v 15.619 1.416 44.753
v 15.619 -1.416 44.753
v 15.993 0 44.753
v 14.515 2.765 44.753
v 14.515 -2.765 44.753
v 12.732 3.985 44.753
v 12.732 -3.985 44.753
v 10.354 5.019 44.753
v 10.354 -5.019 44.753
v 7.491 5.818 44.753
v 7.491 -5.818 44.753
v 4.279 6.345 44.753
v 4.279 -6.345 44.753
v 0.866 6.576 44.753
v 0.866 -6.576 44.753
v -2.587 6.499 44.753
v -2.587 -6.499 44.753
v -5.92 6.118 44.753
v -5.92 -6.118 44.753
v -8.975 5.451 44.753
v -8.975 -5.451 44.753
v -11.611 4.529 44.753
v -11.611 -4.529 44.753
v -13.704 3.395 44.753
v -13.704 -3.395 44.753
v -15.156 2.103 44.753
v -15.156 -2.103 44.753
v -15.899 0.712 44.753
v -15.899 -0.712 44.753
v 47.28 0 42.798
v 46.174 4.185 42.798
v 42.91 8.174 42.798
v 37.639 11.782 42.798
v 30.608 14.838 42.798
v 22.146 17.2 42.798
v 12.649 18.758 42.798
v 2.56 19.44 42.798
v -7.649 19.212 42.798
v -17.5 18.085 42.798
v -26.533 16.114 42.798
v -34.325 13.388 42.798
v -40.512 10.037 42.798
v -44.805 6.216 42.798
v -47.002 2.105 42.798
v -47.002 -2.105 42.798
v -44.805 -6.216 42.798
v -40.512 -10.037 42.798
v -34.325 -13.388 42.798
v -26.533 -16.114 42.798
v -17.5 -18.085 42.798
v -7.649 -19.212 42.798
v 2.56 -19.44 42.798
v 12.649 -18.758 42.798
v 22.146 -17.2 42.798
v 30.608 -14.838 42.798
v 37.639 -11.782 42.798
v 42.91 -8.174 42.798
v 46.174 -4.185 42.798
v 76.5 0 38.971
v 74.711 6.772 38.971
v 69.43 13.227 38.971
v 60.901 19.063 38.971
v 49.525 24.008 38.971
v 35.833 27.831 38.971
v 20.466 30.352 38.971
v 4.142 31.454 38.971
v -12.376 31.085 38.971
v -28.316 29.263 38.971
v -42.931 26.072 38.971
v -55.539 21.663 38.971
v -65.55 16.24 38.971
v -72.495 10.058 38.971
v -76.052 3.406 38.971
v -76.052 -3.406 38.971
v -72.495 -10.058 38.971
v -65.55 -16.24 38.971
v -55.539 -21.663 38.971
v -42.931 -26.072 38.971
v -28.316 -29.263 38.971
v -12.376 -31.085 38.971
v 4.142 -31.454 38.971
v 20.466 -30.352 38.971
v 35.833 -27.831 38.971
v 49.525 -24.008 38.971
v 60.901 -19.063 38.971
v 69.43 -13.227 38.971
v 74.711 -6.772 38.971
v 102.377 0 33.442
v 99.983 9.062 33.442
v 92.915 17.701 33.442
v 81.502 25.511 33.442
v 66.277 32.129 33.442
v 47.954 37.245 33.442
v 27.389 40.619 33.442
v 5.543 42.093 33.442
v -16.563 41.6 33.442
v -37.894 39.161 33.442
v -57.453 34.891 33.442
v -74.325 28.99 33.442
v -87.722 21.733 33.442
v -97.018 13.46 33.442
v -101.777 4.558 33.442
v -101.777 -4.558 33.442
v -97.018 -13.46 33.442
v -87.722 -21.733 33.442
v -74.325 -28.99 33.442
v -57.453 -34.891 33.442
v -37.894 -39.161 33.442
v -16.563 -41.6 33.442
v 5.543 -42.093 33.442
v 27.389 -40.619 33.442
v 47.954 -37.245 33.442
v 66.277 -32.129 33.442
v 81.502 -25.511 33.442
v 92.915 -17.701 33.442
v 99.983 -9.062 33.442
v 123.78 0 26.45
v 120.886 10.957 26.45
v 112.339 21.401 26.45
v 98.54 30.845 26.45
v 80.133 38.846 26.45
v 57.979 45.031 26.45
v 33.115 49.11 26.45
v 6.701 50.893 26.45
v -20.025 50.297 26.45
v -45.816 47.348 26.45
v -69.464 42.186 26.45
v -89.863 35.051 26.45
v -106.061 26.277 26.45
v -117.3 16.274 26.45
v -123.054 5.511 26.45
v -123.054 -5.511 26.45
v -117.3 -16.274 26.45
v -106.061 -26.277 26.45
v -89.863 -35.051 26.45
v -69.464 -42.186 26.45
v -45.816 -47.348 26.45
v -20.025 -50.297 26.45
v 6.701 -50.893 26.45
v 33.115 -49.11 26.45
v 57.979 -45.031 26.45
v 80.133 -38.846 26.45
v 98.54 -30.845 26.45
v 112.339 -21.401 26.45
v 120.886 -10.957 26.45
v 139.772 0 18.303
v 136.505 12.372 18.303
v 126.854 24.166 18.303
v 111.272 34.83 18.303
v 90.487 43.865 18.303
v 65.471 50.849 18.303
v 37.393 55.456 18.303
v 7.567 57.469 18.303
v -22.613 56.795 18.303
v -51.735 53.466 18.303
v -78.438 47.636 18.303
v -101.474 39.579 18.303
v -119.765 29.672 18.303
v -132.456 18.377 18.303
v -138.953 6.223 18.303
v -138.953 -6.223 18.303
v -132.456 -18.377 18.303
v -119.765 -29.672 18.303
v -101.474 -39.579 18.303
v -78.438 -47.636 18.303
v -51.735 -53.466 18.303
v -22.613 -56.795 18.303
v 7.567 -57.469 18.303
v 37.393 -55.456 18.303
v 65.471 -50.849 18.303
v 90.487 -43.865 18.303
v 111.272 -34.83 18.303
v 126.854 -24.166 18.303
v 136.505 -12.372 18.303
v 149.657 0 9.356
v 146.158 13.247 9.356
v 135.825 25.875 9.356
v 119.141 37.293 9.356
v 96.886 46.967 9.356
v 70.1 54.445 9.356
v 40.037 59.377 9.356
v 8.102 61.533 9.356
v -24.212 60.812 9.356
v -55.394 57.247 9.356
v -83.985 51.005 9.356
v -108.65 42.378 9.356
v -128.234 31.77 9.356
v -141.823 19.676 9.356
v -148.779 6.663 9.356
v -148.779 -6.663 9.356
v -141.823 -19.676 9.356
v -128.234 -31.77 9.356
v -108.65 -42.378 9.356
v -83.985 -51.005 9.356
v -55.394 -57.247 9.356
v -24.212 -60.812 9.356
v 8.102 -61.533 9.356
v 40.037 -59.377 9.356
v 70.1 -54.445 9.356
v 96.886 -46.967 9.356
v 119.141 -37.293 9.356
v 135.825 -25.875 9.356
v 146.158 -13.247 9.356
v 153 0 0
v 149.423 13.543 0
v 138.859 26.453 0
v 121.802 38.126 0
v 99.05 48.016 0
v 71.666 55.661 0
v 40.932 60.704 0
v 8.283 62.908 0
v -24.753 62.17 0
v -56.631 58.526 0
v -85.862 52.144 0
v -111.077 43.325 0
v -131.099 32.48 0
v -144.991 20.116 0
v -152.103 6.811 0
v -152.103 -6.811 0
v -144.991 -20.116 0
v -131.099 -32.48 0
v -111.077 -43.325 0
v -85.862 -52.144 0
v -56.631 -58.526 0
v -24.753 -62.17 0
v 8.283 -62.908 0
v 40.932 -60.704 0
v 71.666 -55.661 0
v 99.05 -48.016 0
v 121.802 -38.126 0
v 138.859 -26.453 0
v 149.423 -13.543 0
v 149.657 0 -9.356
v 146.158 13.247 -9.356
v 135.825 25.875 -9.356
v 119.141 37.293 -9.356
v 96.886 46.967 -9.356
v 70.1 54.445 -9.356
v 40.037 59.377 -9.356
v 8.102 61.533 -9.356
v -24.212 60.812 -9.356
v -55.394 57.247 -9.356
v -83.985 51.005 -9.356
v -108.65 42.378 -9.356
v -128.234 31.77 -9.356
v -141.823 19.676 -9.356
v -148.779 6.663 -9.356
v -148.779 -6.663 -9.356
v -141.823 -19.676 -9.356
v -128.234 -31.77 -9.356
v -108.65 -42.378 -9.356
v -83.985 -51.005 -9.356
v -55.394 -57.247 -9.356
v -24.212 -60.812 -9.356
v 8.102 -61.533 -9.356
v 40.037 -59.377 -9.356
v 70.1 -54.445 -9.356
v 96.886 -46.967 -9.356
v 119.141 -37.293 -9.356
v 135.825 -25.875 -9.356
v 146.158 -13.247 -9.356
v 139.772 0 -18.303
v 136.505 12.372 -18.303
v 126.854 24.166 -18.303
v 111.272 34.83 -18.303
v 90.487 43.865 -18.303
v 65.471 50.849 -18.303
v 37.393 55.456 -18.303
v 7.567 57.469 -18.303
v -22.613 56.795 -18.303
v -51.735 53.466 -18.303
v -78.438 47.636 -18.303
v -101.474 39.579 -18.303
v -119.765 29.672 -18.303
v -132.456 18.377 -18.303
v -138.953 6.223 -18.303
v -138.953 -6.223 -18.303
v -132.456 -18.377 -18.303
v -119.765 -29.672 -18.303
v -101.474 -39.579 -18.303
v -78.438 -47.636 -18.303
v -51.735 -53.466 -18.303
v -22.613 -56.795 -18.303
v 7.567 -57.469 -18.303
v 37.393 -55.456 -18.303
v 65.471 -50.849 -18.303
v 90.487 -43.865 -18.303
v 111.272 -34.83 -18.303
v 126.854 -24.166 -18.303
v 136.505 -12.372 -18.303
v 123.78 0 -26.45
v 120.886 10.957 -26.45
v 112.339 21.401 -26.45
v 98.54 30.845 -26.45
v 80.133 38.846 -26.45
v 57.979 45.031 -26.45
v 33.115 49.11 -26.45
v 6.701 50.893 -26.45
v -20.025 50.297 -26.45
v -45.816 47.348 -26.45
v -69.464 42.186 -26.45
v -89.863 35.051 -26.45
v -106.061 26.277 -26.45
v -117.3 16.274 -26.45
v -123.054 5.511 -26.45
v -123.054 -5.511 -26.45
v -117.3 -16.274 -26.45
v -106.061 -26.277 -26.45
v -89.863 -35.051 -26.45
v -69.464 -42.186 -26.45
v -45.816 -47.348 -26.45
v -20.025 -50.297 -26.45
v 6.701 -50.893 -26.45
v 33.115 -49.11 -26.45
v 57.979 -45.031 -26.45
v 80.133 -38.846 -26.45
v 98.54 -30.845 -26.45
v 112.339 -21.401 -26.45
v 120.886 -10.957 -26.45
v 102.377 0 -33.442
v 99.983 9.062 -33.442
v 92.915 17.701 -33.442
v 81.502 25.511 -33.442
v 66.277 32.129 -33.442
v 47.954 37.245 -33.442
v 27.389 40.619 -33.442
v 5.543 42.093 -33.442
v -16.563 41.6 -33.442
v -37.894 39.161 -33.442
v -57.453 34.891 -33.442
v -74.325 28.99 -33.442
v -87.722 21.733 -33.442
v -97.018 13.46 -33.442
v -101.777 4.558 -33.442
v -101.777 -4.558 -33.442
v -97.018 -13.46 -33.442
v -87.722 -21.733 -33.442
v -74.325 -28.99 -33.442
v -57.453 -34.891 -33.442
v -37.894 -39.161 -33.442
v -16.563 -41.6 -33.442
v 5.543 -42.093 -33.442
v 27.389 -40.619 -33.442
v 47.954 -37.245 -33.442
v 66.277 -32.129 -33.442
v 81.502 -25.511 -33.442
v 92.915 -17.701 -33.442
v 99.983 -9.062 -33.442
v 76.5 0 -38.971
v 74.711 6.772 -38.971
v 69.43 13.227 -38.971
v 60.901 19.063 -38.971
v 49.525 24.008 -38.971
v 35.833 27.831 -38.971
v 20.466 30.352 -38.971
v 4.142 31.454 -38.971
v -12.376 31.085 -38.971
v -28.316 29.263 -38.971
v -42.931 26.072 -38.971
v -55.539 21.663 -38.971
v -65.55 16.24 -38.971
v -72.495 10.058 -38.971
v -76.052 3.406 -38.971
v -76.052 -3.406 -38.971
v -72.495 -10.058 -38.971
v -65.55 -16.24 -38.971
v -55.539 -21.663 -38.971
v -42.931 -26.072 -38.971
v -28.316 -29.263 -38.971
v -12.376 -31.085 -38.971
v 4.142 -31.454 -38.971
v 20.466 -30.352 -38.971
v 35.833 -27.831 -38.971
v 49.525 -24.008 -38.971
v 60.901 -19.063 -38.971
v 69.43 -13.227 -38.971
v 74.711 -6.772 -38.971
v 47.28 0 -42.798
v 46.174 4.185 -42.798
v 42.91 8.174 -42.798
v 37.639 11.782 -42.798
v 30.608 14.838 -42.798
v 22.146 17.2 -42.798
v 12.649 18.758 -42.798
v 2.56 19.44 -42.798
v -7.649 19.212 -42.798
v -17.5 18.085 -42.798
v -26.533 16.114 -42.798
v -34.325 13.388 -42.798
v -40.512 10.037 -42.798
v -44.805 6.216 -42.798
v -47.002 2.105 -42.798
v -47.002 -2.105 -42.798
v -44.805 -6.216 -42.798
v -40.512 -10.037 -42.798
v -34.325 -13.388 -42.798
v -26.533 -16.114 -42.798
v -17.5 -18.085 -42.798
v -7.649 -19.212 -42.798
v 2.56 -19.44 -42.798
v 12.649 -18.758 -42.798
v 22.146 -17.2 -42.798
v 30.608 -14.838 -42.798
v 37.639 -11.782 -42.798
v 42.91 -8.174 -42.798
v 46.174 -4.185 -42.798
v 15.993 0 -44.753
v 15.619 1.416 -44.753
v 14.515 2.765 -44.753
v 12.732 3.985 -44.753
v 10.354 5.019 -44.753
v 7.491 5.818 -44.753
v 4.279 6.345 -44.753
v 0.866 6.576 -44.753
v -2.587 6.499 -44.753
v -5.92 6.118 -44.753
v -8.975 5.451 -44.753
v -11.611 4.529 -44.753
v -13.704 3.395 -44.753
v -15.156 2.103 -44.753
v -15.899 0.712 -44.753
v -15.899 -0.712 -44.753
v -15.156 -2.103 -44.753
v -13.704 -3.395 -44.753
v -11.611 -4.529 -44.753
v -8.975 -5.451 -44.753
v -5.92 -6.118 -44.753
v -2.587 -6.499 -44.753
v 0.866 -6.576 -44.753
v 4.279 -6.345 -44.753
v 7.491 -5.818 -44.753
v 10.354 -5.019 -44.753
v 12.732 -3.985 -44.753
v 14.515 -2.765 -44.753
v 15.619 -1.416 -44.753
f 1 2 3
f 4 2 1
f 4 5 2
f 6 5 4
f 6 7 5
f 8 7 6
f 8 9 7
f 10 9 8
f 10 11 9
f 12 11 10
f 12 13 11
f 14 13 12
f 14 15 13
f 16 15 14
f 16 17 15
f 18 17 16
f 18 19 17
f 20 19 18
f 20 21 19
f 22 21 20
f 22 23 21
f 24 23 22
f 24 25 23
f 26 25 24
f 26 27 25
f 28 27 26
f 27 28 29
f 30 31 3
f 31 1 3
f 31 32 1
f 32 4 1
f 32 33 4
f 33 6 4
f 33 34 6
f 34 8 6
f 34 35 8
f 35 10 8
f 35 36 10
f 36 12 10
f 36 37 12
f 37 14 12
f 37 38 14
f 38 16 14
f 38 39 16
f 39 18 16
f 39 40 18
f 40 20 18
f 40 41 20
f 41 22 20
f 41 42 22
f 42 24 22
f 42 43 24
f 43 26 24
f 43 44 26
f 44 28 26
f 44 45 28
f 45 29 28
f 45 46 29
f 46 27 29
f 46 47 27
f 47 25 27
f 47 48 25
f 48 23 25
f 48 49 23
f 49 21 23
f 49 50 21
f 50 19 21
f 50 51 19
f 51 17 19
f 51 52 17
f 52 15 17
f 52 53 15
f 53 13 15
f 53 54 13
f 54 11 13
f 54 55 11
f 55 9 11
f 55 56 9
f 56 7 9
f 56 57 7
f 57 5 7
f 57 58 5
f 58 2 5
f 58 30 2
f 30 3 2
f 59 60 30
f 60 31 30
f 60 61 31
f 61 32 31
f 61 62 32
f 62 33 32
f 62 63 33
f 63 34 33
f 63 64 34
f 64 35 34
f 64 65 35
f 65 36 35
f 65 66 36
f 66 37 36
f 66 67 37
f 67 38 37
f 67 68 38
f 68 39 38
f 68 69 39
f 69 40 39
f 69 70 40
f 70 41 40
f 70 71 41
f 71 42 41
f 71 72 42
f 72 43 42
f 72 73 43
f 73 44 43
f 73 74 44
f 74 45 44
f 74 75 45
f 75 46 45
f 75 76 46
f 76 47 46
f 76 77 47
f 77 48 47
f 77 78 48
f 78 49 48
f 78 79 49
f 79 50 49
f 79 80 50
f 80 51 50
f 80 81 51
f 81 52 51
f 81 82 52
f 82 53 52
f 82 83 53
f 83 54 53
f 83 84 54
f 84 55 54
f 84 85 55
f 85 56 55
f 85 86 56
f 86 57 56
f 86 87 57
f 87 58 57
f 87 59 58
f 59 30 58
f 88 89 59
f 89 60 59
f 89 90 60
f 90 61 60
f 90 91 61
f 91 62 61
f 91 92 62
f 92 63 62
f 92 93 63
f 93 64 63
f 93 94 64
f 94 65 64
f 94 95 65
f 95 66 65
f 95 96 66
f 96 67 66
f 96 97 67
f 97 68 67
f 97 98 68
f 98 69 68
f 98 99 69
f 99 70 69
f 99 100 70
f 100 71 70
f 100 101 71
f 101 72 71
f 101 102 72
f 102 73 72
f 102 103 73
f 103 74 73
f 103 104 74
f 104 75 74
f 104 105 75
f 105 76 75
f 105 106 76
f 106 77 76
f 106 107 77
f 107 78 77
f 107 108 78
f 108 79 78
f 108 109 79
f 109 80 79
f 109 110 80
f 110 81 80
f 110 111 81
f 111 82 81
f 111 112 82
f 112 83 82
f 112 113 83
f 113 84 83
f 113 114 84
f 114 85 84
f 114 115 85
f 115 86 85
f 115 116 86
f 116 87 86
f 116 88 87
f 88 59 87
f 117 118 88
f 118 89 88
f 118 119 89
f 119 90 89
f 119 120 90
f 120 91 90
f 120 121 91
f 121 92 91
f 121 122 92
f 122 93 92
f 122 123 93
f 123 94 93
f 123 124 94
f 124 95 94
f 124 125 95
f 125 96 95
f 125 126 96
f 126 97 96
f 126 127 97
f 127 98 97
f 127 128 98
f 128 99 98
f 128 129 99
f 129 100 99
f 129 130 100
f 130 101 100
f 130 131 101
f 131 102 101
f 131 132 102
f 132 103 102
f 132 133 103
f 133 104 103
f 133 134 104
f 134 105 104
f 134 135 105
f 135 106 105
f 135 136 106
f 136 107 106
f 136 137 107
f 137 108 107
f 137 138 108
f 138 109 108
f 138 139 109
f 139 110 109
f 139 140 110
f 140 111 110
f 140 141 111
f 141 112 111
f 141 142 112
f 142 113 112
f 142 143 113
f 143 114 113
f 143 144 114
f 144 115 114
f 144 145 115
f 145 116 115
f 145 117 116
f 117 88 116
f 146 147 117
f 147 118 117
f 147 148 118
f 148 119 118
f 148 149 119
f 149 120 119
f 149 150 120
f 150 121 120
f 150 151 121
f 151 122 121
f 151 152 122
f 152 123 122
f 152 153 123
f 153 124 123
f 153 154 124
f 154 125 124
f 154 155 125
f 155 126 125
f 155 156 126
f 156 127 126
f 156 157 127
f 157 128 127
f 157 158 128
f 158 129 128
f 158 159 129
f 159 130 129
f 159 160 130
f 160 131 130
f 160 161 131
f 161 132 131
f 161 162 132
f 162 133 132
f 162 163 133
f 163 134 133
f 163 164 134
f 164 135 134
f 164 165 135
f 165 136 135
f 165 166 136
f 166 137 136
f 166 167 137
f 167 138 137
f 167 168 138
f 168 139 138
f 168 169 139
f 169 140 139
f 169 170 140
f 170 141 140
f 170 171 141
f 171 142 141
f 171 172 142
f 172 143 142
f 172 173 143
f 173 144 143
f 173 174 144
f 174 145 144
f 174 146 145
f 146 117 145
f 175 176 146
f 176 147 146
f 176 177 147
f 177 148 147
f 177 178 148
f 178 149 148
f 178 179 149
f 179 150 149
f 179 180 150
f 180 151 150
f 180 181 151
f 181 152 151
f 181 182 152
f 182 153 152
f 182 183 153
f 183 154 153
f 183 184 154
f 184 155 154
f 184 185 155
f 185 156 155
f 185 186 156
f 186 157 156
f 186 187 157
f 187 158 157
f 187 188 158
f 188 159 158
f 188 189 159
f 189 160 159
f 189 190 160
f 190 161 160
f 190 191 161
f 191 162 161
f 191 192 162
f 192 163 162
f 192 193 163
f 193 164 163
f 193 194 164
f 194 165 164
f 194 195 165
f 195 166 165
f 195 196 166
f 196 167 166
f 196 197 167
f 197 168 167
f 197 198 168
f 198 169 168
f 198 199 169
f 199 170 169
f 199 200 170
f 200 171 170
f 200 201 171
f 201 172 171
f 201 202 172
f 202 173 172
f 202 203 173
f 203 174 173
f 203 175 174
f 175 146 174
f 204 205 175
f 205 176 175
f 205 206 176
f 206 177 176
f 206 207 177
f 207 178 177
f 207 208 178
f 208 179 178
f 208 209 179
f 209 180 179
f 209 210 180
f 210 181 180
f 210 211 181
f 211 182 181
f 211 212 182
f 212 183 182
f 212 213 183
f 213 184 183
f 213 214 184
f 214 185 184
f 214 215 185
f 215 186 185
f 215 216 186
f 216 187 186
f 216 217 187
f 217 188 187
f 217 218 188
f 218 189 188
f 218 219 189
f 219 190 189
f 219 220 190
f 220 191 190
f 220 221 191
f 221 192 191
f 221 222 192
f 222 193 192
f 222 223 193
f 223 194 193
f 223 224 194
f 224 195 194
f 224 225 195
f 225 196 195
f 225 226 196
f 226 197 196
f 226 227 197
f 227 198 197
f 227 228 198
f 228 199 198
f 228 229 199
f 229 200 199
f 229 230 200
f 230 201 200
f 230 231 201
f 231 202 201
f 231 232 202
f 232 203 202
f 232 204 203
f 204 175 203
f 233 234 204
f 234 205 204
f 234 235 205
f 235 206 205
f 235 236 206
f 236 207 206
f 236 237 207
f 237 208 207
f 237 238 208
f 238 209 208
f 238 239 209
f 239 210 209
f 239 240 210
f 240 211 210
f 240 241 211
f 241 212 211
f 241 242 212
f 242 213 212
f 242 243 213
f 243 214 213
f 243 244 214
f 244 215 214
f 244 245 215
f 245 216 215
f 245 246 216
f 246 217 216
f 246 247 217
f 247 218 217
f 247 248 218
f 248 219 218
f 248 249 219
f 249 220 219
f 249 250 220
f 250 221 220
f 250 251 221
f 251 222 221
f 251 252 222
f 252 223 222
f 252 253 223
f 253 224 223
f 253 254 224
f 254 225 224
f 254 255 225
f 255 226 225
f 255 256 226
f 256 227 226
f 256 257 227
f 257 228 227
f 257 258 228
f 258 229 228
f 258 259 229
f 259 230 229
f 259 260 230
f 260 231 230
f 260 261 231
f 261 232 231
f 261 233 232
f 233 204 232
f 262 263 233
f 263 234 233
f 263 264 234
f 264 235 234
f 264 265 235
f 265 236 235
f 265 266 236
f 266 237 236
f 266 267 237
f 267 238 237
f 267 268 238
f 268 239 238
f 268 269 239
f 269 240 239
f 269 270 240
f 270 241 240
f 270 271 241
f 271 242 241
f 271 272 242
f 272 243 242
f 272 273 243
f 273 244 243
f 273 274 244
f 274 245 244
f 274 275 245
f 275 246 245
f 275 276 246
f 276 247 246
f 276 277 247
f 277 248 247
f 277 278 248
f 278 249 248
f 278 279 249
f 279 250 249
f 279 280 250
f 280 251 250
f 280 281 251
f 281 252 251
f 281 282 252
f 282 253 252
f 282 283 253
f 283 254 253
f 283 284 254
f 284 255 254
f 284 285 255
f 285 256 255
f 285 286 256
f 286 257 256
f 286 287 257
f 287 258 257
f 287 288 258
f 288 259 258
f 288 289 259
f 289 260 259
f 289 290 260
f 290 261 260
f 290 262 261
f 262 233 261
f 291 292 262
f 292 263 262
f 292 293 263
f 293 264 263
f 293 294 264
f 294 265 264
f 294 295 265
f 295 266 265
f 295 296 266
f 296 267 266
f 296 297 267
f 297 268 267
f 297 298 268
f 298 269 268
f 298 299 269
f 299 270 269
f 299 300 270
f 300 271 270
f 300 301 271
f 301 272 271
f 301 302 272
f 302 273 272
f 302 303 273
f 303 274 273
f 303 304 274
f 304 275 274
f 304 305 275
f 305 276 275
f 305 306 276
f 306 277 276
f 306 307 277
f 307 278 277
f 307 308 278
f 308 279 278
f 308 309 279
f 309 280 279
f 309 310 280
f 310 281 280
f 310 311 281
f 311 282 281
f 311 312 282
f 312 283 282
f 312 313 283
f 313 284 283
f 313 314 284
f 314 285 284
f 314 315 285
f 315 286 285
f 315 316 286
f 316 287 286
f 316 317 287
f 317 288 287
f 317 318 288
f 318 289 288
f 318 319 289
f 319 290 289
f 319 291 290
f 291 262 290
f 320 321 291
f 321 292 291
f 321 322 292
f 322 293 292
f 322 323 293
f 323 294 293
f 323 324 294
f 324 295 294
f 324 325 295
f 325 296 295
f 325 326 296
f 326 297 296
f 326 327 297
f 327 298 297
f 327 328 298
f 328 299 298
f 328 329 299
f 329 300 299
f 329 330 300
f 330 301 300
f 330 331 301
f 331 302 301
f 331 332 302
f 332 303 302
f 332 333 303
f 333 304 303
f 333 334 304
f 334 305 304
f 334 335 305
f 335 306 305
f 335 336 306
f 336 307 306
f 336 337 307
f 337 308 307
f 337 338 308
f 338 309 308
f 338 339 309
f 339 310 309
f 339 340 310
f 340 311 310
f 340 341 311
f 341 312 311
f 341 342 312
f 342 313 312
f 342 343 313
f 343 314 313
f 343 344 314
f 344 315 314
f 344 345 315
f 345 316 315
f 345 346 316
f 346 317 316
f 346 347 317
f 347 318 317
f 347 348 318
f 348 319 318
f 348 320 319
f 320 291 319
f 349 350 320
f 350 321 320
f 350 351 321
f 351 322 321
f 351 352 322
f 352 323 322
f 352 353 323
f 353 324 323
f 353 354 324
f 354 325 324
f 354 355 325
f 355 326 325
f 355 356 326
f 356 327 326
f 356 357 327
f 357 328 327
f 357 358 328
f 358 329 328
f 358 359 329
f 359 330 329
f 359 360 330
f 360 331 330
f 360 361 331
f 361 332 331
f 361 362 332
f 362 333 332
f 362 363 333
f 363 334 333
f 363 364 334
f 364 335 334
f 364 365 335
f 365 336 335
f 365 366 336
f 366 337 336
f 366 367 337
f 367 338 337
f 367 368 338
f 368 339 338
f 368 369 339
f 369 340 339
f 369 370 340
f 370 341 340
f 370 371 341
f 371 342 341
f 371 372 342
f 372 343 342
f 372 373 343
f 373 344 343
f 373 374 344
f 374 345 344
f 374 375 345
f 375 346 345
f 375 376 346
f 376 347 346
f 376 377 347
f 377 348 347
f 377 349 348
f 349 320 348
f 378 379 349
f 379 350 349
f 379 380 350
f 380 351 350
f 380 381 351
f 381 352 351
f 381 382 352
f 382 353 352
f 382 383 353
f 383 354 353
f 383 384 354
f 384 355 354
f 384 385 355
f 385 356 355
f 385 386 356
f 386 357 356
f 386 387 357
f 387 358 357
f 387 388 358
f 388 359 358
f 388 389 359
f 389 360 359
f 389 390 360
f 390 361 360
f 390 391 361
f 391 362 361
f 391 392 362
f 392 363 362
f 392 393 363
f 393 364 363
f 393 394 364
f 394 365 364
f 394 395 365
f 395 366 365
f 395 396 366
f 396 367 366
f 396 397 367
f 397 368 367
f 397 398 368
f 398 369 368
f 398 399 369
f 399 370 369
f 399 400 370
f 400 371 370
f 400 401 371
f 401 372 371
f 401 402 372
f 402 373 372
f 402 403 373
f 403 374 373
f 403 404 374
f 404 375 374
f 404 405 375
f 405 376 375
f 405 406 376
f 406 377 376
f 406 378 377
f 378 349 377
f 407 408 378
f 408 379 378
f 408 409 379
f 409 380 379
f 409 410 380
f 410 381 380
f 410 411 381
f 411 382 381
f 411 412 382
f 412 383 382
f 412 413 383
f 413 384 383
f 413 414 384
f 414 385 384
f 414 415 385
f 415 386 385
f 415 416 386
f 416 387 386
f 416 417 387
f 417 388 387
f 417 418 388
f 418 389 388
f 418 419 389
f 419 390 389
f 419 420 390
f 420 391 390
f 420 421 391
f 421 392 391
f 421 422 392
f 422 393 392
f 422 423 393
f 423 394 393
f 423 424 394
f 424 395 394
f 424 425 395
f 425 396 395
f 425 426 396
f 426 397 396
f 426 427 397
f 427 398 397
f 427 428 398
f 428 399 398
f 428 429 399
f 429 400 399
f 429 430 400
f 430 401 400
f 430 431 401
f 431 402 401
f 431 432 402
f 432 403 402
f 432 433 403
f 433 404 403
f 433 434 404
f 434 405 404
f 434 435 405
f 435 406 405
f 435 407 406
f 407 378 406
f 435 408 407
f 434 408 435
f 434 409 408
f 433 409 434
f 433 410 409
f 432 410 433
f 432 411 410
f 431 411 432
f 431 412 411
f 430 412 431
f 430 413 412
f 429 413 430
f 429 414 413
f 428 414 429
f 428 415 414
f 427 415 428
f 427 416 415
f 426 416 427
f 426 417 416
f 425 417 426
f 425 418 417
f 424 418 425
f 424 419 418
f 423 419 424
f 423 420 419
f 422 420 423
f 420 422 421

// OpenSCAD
// Generated by SolidPython 1.0.1 on 2020-07-29 00:46:52


scale(v = [17, 7, 5]) {
	sphere(r = 9);
}
/***********************************************
*********      SolidPython code:      **********
************************************************
 
# import packages: SolidPython
from solid import *
from solid.utils import *
from itertools import chain, combinations, permutations


class Resize:

    def __init__(self, scad_file):
        self.scad_file = scad_file
        #self.scad_file = import_scad(scad_file)
        # cone/cylinder param:
        self.r1 = 0
        self.r2 = 0
        self.h = 0
        # rectangular prism param:
        self.w = 0
        self.l = 0
        # ellipse param:
        self.r = 0

    # import OpenScad code (file name corresponds to shape)


    # classify shape + parameters
    def assign(self, param1, param2, param3):
        if self.scad_file == 'cone.scad':
            self.r1 = param1
            self.r2 = param2
            self.h = param3
        elif self.scad_file == 'cylinder.scad':
            self.r1 = param1
            self.r2 = param2
            self.h = param3
        elif self.scad_file == 'rectangularPrism.scad':
            self.h = param1
            self.l = param2
            self.w = param3
        else:
            self.r = param1
            self.h = param2

    # resize parameters
    def iterate(self):
        x = range(3, 20, 2)
        i = 1
        if self.scad_file == 'cone.scad':
            tempList = list(permutations(x, 2))
            for temp in tempList:
                param1 = temp[0]
                param2 = temp[1]
                filepath = 'produced_scad_files/' + 'cone' + str(param1) + '_' + str(param2) + '_' + '.scad'
                scad_render_to_file(cylinder(h=param1, r1=param2, r2=0), filepath)

        elif self.scad_file == 'cylinder.scad':
            tempList = list(permutations(x, 3))
            for temp in tempList:
                param1 = temp[0]
                param2 = temp[1]
                filepath = 'produced_scad_files/' + 'cylinder' + str(param1) + '_' + str(param2) + '_' + '.scad'
                scad_render_to_file(cylinder(h=param1, r1=param2, r2=param2), filepath)

        elif self.scad_file == 'rectangularPrism.scad':
            tempList = list(permutations(x, 3))
            for temp in tempList:
                param1 = temp[0]
                param2 = temp[1]
                param3 = temp[2]
                filepath = 'produced_scad_files/' + 'rectangularPrism' + str(param1) + '_' + str(param2) + '_' + str(
                    param3) + '.scad'
                scad_render_to_file(cube(size=(param1, param2, param3)), filepath)

        elif self.scad_file == 'ellipse.scad':
            tempList = list(permutations(x, 4))
            for temp in tempList:
                param1 = temp[0]
                param2 = temp[1]
                param3 = temp[2]
                param4 = temp[3]
                filepath = 'produced_scad_files/' + 'ellipse' + str(param1) + '_' + str(param2) + '_' + str(param3) + '_' + str(param4) + '.scad'
                scad_render_to_file(scale([param1, param2, param3])(sphere(r=param4)), filepath)

    def render_to_scadfile(self):
        scad_render_to_file(scad, 'example.scad') 
 
************************************************/
